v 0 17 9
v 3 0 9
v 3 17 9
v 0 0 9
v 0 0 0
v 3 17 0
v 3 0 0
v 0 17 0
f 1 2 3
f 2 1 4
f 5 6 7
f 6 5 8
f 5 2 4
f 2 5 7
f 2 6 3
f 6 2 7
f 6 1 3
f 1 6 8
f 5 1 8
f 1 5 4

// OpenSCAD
// Generated by SolidPython 1.0.1 on 2020-07-29 00:46:54


cube(size = [3, 17, 9]);
/***********************************************
*********      SolidPython code:      **********
************************************************
 
# import packages: SolidPython
from solid import *
from solid.utils import *
from itertools import chain, combinations, permutations


class Resize:

    def __init__(self, scad_file):
        self.scad_file = scad_file
        #self.scad_file = import_scad(scad_file)
        # cone/cylinder param:
        self.r1 = 0
        self.r2 = 0
        self.h = 0
        # rectangular prism param:
        self.w = 0
        self.l = 0
        # ellipse param:
        self.r = 0

    # import OpenScad code (file name corresponds to shape)


    # classify shape + parameters
    def assign(self, param1, param2, param3):
        if self.scad_file == 'cone.scad':
            self.r1 = param1
            self.r2 = param2
            self.h = param3
        elif self.scad_file == 'cylinder.scad':
            self.r1 = param1
            self.r2 = param2
            self.h = param3
        elif self.scad_file == 'rectangularPrism.scad':
            self.h = param1
            self.l = param2
            self.w = param3
        else:
            self.r = param1
            self.h = param2

    # resize parameters
    def iterate(self):
        x = range(3, 20, 2)
        i = 1
        if self.scad_file == 'cone.scad':
            tempList = list(permutations(x, 2))
            for temp in tempList:
                param1 = temp[0]
                param2 = temp[1]
                filepath = 'produced_scad_files/' + 'cone' + str(param1) + '_' + str(param2) + '_' + '.scad'
                scad_render_to_file(cylinder(h=param1, r1=param2, r2=0), filepath)

        elif self.scad_file == 'cylinder.scad':
            tempList = list(permutations(x, 3))
            for temp in tempList:
                param1 = temp[0]
                param2 = temp[1]
                filepath = 'produced_scad_files/' + 'cylinder' + str(param1) + '_' + str(param2) + '_' + '.scad'
                scad_render_to_file(cylinder(h=param1, r1=param2, r2=param2), filepath)

        elif self.scad_file == 'rectangularPrism.scad':
            tempList = list(permutations(x, 3))
            for temp in tempList:
                param1 = temp[0]
                param2 = temp[1]
                param3 = temp[2]
                filepath = 'produced_scad_files/' + 'rectangularPrism' + str(param1) + '_' + str(param2) + '_' + str(
                    param3) + '.scad'
                scad_render_to_file(cube(size=(param1, param2, param3)), filepath)

        elif self.scad_file == 'ellipse.scad':
            tempList = list(permutations(x, 4))
            for temp in tempList:
                param1 = temp[0]
                param2 = temp[1]
                param3 = temp[2]
                param4 = temp[3]
                filepath = 'produced_scad_files/' + 'ellipse' + str(param1) + '_' + str(param2) + '_' + str(param3) + '_' + str(param4) + '.scad'
                scad_render_to_file(scale([param1, param2, param3])(sphere(r=param4)), filepath)

    def render_to_scadfile(self):
        scad_render_to_file(scad, 'example.scad') 
 
************************************************/
